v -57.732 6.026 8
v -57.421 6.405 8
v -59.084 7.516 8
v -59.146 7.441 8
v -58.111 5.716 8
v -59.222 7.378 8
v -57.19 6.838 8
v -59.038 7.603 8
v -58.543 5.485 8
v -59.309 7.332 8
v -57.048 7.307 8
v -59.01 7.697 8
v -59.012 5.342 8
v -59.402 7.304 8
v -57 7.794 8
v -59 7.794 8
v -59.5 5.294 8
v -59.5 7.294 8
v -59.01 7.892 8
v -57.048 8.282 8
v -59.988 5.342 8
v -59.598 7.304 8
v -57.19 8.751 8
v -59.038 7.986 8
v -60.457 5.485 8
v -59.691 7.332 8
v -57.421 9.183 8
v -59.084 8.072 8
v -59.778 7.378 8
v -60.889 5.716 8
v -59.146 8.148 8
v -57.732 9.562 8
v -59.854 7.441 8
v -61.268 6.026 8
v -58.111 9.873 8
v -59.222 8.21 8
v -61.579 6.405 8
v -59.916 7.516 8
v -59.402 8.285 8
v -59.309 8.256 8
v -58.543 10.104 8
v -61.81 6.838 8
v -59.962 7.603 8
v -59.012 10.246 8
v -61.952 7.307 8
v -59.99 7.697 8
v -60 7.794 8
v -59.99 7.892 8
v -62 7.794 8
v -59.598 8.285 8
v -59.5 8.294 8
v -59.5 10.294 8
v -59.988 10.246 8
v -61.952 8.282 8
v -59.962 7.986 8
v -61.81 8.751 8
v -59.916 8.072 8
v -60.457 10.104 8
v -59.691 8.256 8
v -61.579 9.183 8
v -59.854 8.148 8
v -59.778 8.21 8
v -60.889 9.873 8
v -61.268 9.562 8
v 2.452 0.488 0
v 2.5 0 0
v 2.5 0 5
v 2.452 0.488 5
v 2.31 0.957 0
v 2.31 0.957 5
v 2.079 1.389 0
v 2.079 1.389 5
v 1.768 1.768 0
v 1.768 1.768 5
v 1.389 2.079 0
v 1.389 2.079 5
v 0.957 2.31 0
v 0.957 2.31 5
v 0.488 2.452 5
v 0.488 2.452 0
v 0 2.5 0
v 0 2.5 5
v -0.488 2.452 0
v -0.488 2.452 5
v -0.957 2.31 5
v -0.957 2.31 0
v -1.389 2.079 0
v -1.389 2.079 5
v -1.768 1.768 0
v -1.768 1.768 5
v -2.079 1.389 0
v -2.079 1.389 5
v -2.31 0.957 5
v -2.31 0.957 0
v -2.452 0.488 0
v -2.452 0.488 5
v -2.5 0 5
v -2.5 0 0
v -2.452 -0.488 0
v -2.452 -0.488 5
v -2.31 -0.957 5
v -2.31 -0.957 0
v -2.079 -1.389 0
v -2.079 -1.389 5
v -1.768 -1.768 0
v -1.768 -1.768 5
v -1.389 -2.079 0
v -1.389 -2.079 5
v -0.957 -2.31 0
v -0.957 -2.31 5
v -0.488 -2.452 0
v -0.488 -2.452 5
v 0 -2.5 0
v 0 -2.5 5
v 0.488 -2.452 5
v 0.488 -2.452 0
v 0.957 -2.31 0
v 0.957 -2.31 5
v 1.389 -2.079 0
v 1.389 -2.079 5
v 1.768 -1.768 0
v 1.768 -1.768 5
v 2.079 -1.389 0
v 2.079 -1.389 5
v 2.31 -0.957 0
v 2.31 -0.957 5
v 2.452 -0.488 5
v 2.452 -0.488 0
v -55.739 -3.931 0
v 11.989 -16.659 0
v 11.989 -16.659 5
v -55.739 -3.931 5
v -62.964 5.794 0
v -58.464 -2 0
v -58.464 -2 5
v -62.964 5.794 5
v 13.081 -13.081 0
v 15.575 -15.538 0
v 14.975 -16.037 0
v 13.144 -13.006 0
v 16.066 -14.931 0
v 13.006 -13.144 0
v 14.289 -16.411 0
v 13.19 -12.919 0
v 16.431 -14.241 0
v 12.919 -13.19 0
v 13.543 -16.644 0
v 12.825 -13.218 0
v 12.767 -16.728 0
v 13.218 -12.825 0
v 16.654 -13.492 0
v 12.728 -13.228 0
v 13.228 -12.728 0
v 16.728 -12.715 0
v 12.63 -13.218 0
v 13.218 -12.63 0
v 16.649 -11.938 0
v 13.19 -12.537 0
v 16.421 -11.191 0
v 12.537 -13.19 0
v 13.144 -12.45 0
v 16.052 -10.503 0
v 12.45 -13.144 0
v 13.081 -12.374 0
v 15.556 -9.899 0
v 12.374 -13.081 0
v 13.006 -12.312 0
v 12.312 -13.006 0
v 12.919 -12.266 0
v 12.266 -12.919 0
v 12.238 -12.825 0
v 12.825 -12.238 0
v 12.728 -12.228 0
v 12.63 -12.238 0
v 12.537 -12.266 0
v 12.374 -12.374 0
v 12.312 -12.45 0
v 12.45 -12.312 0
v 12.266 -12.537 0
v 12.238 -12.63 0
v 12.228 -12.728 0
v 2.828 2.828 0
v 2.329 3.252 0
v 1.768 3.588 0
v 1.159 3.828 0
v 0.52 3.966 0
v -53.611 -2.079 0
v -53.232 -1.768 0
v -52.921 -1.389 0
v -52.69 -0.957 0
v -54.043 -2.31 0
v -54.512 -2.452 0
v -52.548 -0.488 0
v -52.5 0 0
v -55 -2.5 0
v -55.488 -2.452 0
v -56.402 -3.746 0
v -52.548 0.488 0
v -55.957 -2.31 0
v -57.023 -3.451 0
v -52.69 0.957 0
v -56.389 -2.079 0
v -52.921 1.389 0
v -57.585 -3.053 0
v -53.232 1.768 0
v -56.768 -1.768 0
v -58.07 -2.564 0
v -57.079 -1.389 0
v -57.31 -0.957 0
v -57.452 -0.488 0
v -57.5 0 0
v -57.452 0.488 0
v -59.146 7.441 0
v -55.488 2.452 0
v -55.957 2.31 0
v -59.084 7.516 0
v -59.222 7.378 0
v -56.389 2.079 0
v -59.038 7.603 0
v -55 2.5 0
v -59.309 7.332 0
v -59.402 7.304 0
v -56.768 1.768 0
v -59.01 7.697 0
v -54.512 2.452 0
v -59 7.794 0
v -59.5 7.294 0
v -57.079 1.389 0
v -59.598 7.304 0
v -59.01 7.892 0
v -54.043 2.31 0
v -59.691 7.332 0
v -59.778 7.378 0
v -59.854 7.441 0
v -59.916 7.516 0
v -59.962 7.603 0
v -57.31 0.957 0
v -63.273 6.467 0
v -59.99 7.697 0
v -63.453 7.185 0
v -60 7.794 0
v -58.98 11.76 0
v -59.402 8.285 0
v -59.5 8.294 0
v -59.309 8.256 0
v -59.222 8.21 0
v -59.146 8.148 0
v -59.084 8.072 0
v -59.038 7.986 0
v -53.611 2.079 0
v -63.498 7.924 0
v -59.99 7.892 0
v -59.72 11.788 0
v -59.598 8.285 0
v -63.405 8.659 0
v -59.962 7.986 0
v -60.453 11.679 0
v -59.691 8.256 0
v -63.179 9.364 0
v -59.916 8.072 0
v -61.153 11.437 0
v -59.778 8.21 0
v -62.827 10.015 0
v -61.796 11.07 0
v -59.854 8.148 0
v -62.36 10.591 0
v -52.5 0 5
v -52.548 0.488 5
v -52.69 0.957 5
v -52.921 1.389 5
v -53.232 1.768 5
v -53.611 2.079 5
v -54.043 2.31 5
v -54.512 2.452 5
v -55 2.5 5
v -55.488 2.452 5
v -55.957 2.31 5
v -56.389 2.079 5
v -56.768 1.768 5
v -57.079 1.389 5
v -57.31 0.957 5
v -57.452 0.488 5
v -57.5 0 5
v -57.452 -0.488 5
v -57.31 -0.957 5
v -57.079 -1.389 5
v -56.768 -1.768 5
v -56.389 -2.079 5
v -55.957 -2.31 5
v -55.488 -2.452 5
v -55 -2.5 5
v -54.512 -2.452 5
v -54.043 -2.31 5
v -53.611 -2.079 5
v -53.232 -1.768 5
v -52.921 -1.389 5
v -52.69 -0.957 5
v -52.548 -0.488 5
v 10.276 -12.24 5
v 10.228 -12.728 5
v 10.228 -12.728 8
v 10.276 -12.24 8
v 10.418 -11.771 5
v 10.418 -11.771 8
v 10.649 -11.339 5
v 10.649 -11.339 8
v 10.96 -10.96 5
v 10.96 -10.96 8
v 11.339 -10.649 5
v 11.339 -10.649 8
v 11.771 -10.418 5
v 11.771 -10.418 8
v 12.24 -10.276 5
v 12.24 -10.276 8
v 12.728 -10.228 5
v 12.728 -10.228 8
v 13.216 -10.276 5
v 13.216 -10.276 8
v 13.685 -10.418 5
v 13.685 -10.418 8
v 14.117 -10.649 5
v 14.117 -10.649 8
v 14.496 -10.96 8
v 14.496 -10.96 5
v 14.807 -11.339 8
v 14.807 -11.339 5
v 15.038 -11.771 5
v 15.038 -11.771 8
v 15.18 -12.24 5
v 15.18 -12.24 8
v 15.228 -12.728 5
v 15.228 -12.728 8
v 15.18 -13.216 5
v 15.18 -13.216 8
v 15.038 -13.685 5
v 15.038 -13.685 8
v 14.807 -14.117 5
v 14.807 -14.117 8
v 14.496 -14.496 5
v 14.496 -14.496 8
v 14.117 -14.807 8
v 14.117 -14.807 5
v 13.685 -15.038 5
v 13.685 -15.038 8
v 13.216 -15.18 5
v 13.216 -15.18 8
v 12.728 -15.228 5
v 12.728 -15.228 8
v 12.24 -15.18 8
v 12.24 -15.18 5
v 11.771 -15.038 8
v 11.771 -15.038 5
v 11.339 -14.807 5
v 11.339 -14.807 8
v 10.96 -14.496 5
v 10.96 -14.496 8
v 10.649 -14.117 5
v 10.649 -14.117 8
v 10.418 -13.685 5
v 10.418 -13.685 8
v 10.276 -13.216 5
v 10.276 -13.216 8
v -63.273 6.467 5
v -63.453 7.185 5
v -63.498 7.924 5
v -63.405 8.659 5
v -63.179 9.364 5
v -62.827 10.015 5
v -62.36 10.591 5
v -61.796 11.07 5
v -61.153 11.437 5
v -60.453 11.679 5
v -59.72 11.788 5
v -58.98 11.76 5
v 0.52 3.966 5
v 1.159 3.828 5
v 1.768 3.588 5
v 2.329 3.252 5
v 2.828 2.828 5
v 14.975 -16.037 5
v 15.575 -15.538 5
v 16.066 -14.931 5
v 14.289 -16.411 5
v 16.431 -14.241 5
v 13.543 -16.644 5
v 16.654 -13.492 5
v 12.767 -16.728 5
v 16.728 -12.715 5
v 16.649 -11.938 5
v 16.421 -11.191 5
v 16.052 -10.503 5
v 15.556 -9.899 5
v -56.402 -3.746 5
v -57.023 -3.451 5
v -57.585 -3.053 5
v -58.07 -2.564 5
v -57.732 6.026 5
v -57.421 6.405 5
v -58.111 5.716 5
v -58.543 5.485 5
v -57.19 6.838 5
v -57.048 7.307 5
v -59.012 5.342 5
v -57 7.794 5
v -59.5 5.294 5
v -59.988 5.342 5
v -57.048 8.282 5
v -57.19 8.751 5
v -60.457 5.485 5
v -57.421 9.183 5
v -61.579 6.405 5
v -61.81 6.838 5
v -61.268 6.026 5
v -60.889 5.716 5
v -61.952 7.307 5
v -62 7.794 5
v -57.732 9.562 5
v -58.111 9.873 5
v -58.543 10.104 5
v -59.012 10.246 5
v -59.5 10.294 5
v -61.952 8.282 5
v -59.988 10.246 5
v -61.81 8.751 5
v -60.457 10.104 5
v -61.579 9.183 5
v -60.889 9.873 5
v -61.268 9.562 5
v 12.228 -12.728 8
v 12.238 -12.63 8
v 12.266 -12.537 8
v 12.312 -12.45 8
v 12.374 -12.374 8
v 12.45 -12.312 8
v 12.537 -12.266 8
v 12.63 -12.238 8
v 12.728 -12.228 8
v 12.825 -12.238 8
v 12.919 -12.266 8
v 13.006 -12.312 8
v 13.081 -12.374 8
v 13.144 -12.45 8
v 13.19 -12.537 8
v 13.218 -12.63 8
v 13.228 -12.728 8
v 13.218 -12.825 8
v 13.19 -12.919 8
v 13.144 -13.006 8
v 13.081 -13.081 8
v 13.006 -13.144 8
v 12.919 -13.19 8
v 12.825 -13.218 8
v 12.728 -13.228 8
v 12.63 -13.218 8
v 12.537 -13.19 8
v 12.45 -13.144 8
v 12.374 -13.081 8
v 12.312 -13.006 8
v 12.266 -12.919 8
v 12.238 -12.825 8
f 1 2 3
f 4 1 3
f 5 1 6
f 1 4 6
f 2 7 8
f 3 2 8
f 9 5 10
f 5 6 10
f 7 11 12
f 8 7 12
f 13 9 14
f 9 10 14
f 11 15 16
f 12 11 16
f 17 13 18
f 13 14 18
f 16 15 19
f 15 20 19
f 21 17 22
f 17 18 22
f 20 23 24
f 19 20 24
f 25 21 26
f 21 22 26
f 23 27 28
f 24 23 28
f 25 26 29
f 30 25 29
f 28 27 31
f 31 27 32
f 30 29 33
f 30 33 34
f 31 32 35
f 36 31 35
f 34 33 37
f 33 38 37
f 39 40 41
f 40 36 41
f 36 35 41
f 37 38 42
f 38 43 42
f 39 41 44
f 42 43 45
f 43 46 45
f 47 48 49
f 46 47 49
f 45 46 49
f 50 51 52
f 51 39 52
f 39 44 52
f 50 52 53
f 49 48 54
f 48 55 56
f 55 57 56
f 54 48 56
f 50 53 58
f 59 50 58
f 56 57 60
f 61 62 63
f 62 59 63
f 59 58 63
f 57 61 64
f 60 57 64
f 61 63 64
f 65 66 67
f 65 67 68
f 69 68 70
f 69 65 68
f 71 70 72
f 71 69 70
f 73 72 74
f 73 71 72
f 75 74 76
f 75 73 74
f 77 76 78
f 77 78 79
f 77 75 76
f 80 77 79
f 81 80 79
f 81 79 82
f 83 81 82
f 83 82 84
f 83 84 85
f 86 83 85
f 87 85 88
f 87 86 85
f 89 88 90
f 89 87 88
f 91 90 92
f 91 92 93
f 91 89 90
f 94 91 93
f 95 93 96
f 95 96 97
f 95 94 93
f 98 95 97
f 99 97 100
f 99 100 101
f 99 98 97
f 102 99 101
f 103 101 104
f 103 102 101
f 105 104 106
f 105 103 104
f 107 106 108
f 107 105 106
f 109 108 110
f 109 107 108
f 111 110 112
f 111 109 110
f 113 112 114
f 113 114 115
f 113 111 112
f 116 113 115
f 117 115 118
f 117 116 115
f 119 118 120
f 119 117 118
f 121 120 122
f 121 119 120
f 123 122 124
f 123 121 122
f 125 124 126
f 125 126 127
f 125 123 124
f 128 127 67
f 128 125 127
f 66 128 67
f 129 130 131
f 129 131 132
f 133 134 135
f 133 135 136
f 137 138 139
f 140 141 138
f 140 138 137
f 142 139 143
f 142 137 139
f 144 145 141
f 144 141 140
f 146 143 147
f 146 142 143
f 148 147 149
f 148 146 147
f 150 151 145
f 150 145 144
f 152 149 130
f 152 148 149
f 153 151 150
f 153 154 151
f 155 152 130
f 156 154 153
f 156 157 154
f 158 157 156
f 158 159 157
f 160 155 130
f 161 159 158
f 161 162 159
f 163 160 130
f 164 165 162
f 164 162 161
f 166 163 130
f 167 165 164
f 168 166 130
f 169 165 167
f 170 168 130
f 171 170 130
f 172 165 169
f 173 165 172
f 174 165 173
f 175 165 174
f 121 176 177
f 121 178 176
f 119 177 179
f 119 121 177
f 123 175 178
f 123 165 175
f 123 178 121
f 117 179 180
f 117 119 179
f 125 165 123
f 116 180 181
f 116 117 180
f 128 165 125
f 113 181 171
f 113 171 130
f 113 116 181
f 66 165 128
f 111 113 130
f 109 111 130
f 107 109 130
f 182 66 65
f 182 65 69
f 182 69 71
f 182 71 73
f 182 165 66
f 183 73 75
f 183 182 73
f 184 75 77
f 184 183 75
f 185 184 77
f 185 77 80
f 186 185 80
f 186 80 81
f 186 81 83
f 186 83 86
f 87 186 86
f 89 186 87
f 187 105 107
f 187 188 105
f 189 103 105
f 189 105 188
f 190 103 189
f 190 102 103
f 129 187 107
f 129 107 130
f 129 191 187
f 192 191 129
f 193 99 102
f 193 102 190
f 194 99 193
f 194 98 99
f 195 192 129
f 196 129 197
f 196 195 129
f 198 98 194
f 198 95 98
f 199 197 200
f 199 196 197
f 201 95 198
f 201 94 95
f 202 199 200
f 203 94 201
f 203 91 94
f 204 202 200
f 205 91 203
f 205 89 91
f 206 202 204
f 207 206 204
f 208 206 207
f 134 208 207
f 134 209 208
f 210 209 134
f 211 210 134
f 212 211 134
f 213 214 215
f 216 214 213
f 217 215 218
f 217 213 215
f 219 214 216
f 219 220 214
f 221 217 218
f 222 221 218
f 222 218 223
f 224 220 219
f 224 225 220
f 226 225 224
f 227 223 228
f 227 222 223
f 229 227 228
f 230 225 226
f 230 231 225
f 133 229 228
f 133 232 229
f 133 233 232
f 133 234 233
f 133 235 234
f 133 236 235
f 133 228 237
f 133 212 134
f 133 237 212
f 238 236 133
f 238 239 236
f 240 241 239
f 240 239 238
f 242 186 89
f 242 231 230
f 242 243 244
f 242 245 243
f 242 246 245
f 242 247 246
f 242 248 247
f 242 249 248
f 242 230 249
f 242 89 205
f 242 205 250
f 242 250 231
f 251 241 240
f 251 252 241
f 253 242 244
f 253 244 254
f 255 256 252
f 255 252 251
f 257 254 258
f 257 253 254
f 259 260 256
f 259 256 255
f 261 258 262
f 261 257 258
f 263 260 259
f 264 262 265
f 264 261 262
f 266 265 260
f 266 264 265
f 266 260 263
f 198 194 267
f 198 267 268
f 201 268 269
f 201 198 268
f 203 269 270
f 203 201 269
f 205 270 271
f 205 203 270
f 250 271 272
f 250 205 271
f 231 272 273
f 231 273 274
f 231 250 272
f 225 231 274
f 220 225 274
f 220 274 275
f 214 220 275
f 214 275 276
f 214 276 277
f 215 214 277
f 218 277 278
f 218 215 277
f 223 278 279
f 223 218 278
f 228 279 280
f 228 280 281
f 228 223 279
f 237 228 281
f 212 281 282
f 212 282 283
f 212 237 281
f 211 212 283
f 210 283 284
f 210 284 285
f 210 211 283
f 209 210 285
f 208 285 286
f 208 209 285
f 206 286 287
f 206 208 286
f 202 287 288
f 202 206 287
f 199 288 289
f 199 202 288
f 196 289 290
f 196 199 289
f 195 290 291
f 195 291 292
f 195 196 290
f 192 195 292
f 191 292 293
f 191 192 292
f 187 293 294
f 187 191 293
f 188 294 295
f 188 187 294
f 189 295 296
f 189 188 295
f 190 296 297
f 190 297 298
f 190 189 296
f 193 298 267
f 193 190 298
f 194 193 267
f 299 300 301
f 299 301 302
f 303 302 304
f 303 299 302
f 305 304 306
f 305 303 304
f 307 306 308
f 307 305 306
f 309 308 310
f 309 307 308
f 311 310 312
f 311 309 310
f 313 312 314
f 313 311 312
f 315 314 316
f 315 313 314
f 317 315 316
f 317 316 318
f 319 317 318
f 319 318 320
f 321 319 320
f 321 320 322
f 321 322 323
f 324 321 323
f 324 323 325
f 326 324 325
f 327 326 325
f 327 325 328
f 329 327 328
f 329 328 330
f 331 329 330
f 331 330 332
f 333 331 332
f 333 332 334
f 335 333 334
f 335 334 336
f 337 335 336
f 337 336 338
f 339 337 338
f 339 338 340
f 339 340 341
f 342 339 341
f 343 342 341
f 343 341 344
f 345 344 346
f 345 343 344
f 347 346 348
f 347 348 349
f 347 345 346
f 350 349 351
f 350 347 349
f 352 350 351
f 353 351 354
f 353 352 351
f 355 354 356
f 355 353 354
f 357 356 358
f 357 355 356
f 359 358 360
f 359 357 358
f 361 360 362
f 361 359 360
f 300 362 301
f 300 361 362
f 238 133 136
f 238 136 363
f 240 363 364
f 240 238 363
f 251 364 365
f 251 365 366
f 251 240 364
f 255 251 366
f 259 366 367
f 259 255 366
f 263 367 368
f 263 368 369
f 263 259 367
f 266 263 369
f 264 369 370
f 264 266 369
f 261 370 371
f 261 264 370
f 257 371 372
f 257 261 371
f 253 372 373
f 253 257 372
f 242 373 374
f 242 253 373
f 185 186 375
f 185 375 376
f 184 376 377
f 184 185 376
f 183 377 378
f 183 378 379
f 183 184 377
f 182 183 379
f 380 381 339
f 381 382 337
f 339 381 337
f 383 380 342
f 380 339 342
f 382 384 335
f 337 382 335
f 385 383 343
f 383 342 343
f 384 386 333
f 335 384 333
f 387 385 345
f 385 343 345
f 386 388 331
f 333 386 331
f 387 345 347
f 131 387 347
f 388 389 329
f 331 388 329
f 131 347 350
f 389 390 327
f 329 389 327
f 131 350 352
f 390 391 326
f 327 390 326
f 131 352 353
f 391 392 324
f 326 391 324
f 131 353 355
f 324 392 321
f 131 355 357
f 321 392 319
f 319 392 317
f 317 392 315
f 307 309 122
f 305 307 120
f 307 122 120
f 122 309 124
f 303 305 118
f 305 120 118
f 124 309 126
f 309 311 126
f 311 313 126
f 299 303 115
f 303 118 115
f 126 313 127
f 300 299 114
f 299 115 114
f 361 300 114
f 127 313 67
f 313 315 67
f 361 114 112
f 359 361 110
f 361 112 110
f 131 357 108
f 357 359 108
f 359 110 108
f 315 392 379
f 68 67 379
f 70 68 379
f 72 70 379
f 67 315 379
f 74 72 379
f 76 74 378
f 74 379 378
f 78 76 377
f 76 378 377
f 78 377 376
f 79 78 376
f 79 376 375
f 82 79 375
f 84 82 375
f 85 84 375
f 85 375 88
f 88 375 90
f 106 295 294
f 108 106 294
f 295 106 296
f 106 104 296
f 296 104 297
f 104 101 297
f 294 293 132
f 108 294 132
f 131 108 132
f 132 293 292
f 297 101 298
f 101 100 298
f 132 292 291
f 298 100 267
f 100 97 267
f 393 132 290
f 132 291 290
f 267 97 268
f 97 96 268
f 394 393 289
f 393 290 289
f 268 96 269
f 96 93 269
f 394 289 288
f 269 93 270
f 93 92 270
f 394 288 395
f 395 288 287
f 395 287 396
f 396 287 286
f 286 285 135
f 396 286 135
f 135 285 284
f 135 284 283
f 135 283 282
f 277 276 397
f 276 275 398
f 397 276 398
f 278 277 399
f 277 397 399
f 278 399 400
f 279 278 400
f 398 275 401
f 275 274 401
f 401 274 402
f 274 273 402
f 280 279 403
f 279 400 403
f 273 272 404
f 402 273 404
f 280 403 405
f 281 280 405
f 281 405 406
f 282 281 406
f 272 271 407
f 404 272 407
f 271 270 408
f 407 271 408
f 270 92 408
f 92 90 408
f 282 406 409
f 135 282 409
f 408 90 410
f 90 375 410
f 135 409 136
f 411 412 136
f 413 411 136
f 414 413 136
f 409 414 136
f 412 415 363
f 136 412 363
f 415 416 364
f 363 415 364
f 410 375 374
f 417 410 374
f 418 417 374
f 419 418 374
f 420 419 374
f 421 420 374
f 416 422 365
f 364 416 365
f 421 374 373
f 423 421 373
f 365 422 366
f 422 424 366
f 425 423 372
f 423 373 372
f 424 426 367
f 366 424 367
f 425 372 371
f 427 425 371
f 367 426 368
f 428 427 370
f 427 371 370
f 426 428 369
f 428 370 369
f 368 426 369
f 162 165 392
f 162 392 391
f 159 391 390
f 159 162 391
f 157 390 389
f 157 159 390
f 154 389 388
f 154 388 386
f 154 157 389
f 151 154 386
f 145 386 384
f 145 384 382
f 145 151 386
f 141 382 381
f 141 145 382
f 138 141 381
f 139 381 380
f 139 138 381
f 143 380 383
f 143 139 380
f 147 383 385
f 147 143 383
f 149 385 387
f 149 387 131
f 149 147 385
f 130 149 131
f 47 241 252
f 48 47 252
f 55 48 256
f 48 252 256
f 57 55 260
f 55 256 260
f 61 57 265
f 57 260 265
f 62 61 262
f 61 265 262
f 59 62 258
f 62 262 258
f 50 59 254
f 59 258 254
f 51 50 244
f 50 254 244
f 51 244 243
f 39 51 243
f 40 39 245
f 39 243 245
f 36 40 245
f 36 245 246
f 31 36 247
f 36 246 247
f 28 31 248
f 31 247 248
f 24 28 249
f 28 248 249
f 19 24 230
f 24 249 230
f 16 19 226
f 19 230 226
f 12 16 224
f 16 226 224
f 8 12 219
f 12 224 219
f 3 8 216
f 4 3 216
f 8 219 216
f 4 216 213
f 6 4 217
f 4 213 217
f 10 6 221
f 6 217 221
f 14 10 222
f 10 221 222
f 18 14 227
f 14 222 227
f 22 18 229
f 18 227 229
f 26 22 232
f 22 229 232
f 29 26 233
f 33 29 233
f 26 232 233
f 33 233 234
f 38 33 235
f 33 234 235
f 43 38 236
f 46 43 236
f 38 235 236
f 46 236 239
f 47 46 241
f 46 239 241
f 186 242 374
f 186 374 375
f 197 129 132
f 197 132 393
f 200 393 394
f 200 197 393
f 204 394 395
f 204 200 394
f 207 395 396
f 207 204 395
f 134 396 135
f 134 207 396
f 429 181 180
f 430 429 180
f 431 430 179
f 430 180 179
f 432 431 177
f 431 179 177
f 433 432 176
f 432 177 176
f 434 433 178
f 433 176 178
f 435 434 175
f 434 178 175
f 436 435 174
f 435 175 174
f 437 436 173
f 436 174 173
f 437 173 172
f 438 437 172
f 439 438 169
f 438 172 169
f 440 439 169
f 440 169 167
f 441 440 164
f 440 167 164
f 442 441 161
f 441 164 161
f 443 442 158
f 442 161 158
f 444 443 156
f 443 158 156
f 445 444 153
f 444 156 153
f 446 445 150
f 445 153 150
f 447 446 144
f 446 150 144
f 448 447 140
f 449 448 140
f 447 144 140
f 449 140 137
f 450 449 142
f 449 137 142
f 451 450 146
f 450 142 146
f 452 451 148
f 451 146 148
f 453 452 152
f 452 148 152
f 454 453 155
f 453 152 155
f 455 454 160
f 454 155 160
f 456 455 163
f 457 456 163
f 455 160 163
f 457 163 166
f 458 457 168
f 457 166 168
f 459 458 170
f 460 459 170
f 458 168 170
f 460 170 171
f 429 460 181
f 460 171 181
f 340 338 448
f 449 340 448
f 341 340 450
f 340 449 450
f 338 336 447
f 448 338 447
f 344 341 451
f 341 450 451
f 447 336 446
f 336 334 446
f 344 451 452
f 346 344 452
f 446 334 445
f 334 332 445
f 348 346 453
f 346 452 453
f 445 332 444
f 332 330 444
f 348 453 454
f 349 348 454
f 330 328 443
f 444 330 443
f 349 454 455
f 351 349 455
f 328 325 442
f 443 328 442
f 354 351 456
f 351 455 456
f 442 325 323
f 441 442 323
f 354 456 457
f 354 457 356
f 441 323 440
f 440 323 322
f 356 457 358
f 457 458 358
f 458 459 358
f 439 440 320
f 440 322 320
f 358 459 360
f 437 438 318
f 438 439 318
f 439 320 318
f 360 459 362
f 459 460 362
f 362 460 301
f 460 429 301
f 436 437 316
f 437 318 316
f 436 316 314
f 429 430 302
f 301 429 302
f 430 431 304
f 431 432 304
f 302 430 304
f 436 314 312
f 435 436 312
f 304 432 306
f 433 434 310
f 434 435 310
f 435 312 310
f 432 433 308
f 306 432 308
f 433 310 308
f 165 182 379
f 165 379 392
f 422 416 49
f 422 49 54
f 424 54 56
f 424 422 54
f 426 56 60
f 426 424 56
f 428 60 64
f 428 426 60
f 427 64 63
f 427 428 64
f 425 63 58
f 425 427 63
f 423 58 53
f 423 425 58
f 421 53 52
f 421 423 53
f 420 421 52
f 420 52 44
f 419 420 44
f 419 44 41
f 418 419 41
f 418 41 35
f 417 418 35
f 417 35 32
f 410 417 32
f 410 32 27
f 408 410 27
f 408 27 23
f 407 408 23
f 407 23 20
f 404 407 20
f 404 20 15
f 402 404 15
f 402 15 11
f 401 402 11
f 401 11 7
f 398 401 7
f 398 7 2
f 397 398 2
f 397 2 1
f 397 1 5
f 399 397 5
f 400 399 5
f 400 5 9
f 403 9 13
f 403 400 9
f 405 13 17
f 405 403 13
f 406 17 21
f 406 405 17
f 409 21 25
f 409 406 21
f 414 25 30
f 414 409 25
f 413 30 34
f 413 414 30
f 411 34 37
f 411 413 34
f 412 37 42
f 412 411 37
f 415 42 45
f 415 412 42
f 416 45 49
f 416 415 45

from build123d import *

# Parameters (mm, degrees)
SKETCH2_R           = 2.5
BOSS_EXTRUDE1_DEPTH = 5
SKETCH4_R           = 2.5
SKETCH4_R_2         = 0.5
BOSS_EXTRUDE3_DEPTH = 8


with BuildPart() as part:
    # Sketch2 → Boss-Extrude1 (new body)
    with BuildSketch(Plane.XY):
        with BuildLine():
            Line((-58.980456911, 11.76034449), (0.519543089, 3.966115855))
            ThreePointArc((0.519543089, 3.966115855), (1.767996055, 3.588062144), (2.828427125, 2.828427125))
            Line((2.828427125, 2.828427125), (15.556349186, -9.899494937))
            ThreePointArc((15.556349186, -9.899494937), (16.265540761, -14.594805544), (11.989145433, -16.659106246))
            Line((11.989145433, -16.659106246), (-55.738776628, -3.931184185))
            ThreePointArc((-55.738776628, -3.931184185), (-57.312663934, -3.263676689), (-58.464101615, -2))
            Line((-58.464101615, -2), (-62.964101615, 5.794228634))
            ThreePointArc((-62.964101615, 5.794228634), (-62.826595982, 10.015435327), (-58.980456911, 11.76034449))
        make_face()
        with Locations((-55, 0)):
            Circle(SKETCH2_R, mode=Mode.SUBTRACT)
        with Locations((-59.5, 7.794228634)):
            Circle(SKETCH2_R, mode=Mode.SUBTRACT)
        Circle(SKETCH2_R, mode=Mode.SUBTRACT)
        with Locations((12.727922061, -12.727922061)):
            Circle(SKETCH2_R, mode=Mode.SUBTRACT)
    extrude(amount=BOSS_EXTRUDE1_DEPTH)

    # Sketch4 → Boss-Extrude3 (add)
    # profile 1 of 2: a face of its own
    with BuildSketch(Plane(origin=(0, 0, 0), x_dir=(-1, 0, 0), z_dir=(0, 0, -1))):
        with Locations((59.5, 7.794228634)):
            Circle(SKETCH4_R)
        with Locations((59.5, 7.794228634)):
            Circle(SKETCH4_R_2, mode=Mode.SUBTRACT)
    # profile 2 of 2: a face of its own
    with BuildSketch(Plane(origin=(0, 0, 0), x_dir=(-1, 0, 0), z_dir=(0, 0, -1))):
        with Locations((-12.727922061, -12.727922061)):
            Circle(SKETCH4_R)
        with Locations((-12.727922061, -12.727922061)):
            Circle(SKETCH4_R_2, mode=Mode.SUBTRACT)
    extrude(amount=-BOSS_EXTRUDE3_DEPTH)


solid = part.part
